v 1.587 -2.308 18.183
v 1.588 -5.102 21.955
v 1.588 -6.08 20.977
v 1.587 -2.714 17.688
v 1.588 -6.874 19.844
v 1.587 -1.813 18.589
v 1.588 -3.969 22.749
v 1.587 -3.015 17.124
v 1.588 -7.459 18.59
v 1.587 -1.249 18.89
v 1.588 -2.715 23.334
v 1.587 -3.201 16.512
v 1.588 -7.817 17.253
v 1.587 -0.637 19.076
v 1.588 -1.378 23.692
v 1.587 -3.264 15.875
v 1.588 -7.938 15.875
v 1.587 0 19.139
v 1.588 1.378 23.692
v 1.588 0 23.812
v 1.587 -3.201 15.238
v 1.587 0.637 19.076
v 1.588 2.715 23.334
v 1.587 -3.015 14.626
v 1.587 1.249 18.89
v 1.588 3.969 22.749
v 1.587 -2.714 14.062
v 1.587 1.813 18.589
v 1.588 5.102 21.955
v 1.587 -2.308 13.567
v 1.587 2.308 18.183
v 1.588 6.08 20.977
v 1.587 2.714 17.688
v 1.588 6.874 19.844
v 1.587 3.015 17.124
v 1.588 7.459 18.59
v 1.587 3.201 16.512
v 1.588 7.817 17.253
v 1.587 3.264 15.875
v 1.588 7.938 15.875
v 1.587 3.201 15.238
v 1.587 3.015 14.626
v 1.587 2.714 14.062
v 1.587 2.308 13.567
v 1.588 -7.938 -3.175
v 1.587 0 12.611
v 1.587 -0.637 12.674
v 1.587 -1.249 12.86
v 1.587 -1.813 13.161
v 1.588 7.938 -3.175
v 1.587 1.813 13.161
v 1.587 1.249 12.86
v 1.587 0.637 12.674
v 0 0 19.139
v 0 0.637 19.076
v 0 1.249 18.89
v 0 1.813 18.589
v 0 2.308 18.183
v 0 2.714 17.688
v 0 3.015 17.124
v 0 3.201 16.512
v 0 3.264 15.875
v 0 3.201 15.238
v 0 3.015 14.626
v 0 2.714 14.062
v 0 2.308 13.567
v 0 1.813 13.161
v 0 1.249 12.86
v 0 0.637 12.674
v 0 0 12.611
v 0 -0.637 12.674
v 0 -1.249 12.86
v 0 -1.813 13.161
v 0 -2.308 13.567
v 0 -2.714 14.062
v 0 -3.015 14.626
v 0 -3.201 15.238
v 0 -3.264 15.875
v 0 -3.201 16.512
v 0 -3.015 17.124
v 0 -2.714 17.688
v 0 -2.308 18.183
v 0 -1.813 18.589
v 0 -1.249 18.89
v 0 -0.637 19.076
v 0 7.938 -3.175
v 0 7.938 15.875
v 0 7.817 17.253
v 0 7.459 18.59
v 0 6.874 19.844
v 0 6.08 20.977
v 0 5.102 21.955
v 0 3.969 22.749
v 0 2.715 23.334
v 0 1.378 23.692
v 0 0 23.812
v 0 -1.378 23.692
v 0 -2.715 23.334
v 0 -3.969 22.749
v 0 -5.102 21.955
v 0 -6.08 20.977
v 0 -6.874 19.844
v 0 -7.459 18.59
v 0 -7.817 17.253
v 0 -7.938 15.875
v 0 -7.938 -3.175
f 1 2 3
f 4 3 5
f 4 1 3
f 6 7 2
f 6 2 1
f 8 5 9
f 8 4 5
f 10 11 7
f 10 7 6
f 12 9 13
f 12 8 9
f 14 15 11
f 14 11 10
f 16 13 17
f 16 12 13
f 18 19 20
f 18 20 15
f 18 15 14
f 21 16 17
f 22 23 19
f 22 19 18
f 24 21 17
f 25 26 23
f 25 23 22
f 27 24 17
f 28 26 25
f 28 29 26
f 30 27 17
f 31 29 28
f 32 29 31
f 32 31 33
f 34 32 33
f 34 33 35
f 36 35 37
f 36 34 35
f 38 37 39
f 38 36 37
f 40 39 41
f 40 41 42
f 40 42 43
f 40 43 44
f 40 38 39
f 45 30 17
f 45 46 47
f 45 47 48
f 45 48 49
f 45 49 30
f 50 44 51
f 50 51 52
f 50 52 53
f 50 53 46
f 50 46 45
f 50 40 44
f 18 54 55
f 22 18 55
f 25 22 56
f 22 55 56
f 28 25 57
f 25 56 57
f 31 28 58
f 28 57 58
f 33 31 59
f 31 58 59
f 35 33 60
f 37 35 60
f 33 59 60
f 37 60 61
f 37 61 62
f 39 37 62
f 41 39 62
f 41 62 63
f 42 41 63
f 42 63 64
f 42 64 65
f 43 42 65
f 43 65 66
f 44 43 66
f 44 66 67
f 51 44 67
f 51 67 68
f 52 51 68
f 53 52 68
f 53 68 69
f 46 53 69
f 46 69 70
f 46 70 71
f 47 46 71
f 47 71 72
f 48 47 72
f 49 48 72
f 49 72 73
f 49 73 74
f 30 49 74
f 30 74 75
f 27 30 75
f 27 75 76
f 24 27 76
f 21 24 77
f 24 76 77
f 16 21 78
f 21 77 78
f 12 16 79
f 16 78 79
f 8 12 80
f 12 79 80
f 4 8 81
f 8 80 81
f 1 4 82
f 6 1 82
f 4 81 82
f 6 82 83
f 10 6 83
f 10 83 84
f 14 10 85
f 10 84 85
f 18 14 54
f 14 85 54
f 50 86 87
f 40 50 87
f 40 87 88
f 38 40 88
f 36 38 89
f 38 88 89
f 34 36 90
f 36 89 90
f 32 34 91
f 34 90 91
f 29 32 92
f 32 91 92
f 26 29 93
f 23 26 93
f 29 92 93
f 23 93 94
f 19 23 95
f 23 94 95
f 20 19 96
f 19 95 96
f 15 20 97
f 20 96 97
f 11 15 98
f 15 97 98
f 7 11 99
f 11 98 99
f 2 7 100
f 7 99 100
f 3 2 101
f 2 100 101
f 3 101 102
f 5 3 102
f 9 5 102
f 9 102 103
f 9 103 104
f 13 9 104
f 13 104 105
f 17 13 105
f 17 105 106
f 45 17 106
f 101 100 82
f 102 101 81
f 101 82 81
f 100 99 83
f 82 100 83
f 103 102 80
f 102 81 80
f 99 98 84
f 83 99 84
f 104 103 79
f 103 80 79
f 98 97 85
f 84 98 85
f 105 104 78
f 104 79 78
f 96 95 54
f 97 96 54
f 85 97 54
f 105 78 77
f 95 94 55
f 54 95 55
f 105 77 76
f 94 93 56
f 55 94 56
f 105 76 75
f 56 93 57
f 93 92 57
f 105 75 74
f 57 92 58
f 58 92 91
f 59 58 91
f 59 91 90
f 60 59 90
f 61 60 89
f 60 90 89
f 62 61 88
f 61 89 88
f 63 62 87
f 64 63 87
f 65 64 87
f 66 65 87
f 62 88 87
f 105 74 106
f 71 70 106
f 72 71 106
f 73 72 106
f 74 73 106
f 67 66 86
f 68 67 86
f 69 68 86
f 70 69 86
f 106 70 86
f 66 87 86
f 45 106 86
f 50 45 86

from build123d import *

# Parameters (mm, degrees)
BOSS_EXTRUDE1_DEPTH     = 1.5875
F_1_4_CLEARANCE_HOLE1_D = 6.5278


with BuildPart() as part:
    # Sketch1 → Boss-Extrude1 (new body)
    with BuildSketch(Plane(origin=(0, 0, 0), x_dir=(0, 0, -1), z_dir=(1, 0, 0))):
        with BuildLine():
            Line((3.175, -7.9375), (3.175, 7.9375))
            Line((3.175, 7.9375), (-15.875, 7.9375))
            ThreePointArc((-15.875, 7.9375), (-23.8125, 0), (-15.875, -7.9375))
            Line((-15.875, -7.9375), (3.175, -7.9375))
        make_face()
    extrude(amount=BOSS_EXTRUDE1_DEPTH)

    # 1/4 Clearance Hole1 (through all)
    with Locations(Plane(origin=(1.5875, 0, 0), x_dir=(0, 0, -1), z_dir=(1, 0, 0))):
        with Locations((-15.875, 0)):
            Hole(F_1_4_CLEARANCE_HOLE1_D / 2)


solid = part.part
